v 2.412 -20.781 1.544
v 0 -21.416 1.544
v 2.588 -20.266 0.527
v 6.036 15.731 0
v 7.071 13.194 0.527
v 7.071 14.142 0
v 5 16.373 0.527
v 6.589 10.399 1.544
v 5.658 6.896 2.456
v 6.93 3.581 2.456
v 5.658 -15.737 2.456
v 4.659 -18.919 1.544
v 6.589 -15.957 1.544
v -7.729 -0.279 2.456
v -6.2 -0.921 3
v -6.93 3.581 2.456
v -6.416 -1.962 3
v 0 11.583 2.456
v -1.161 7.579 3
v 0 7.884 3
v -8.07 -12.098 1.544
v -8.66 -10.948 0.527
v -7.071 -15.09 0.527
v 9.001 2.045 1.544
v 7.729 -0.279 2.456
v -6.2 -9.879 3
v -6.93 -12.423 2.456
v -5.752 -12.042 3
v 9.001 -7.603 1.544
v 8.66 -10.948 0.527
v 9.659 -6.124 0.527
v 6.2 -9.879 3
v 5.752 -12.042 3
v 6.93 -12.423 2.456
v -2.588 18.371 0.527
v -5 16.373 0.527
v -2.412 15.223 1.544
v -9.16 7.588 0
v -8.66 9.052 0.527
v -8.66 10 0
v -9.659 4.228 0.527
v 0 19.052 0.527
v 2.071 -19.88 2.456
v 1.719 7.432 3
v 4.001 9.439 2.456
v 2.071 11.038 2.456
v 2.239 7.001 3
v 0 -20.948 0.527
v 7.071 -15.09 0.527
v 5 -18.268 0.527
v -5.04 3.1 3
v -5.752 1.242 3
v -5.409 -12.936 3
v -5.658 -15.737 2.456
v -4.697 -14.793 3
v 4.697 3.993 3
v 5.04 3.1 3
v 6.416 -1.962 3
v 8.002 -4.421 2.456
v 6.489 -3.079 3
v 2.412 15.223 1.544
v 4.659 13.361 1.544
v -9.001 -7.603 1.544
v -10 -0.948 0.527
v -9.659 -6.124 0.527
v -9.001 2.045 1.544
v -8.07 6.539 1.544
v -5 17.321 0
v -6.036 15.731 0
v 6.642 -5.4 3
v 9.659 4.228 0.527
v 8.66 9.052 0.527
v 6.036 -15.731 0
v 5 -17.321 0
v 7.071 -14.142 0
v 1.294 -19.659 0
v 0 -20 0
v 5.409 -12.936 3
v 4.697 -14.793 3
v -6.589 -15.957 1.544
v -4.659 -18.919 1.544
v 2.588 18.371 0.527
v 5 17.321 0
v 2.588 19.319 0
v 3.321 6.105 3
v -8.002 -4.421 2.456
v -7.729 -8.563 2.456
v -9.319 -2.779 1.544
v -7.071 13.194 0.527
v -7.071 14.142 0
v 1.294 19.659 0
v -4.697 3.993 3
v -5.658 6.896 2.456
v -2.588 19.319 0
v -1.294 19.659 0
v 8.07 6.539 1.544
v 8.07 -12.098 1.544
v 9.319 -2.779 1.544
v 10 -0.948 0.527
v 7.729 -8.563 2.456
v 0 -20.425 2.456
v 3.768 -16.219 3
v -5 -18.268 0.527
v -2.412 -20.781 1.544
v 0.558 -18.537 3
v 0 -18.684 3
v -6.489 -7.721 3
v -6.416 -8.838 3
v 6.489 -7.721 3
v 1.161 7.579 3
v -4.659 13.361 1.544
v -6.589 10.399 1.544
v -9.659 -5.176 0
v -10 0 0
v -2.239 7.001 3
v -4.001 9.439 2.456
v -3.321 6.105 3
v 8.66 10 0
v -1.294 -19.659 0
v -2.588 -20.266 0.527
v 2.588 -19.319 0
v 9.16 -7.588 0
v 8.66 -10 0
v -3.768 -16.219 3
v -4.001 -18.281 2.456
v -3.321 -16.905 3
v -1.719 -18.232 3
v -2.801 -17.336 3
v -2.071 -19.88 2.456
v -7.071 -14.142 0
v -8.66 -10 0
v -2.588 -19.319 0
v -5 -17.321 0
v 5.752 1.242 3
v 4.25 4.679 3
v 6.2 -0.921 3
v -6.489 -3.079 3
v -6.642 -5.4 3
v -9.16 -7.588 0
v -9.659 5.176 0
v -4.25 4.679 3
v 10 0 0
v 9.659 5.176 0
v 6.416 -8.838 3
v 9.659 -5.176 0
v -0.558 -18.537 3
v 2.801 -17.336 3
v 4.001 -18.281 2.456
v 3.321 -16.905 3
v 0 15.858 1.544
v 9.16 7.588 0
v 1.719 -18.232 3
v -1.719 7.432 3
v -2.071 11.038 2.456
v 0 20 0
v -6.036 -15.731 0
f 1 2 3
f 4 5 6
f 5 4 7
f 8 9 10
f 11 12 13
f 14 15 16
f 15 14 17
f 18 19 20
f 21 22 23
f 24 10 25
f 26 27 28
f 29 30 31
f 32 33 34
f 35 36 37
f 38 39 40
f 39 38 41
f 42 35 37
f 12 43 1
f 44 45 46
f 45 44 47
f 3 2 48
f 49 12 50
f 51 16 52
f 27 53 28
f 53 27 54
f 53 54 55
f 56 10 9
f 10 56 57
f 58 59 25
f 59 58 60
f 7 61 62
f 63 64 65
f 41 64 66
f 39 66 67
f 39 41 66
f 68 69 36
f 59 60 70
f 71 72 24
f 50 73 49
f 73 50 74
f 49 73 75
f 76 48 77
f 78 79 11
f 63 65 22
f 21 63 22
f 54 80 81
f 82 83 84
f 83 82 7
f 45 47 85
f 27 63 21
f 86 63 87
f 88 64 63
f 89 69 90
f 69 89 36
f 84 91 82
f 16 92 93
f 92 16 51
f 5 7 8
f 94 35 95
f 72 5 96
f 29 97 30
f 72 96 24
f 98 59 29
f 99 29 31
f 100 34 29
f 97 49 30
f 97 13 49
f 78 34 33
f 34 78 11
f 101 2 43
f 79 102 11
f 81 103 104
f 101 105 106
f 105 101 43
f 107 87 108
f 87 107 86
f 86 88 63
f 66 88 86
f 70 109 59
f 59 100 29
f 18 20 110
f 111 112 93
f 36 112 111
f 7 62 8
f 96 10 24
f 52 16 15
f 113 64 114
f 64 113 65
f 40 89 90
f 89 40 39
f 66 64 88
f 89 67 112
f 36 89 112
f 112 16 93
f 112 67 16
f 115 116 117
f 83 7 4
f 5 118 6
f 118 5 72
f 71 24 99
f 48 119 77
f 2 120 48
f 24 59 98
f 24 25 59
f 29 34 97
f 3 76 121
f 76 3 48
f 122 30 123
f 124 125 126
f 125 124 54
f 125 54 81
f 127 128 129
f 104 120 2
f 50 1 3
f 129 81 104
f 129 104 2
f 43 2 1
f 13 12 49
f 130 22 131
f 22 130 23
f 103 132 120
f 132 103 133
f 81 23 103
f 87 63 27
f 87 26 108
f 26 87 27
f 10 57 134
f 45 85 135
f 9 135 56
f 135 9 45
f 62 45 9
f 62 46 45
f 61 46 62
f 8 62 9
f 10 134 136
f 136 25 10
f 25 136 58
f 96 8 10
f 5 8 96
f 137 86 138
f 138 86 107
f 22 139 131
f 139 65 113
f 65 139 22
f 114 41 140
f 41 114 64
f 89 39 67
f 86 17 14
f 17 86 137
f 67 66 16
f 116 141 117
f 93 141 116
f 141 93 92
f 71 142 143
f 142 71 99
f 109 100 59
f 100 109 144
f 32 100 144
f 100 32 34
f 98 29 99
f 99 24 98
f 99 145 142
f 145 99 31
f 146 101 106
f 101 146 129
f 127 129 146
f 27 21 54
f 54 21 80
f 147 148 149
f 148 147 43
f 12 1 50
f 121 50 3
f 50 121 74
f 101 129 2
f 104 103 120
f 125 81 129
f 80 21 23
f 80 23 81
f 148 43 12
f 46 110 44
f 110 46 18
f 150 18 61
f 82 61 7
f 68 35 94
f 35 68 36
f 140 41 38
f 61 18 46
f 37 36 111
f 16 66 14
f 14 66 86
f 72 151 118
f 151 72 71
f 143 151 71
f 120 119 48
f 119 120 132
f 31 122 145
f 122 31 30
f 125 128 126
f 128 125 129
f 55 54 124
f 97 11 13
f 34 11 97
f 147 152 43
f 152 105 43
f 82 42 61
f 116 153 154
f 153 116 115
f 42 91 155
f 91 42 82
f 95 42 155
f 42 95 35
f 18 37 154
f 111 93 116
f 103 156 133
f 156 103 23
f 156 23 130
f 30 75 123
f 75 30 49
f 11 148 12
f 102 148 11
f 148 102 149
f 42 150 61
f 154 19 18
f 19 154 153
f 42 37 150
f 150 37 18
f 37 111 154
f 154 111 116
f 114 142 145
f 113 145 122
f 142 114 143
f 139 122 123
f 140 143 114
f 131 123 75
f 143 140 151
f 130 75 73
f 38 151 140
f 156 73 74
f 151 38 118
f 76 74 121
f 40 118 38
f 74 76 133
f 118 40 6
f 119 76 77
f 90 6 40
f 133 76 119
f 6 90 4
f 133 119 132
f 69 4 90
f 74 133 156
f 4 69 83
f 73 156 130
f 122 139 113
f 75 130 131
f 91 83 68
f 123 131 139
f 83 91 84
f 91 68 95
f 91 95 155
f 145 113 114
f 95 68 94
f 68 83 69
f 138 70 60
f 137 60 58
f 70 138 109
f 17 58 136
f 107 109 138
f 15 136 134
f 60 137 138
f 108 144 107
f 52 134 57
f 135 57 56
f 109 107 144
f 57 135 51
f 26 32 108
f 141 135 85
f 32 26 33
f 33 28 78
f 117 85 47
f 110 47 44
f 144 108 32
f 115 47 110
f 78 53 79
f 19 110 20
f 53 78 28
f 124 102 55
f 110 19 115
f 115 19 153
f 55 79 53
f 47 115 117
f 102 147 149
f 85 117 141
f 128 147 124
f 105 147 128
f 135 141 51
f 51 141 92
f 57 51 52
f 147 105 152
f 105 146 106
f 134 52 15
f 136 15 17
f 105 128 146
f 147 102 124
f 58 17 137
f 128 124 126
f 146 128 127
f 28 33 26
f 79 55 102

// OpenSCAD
module body0() {
   multmatrix(m = [ [1, 0,    0,   0],
                    [0,  1, -1.8,   0],
                    [0,  0,    1, 0],
                    [0,  0,    0,   1] ])
    resize([20,40,8])
       sphere(r=10,center=true,$fn=24);
}
module body() {
difference() {
	body0();
   translate([0,0,-4])
		cube([60,60,8],center=true);
   translate([0,0,7])
		cube([60,60,8],center=true);
  }
}

body();
